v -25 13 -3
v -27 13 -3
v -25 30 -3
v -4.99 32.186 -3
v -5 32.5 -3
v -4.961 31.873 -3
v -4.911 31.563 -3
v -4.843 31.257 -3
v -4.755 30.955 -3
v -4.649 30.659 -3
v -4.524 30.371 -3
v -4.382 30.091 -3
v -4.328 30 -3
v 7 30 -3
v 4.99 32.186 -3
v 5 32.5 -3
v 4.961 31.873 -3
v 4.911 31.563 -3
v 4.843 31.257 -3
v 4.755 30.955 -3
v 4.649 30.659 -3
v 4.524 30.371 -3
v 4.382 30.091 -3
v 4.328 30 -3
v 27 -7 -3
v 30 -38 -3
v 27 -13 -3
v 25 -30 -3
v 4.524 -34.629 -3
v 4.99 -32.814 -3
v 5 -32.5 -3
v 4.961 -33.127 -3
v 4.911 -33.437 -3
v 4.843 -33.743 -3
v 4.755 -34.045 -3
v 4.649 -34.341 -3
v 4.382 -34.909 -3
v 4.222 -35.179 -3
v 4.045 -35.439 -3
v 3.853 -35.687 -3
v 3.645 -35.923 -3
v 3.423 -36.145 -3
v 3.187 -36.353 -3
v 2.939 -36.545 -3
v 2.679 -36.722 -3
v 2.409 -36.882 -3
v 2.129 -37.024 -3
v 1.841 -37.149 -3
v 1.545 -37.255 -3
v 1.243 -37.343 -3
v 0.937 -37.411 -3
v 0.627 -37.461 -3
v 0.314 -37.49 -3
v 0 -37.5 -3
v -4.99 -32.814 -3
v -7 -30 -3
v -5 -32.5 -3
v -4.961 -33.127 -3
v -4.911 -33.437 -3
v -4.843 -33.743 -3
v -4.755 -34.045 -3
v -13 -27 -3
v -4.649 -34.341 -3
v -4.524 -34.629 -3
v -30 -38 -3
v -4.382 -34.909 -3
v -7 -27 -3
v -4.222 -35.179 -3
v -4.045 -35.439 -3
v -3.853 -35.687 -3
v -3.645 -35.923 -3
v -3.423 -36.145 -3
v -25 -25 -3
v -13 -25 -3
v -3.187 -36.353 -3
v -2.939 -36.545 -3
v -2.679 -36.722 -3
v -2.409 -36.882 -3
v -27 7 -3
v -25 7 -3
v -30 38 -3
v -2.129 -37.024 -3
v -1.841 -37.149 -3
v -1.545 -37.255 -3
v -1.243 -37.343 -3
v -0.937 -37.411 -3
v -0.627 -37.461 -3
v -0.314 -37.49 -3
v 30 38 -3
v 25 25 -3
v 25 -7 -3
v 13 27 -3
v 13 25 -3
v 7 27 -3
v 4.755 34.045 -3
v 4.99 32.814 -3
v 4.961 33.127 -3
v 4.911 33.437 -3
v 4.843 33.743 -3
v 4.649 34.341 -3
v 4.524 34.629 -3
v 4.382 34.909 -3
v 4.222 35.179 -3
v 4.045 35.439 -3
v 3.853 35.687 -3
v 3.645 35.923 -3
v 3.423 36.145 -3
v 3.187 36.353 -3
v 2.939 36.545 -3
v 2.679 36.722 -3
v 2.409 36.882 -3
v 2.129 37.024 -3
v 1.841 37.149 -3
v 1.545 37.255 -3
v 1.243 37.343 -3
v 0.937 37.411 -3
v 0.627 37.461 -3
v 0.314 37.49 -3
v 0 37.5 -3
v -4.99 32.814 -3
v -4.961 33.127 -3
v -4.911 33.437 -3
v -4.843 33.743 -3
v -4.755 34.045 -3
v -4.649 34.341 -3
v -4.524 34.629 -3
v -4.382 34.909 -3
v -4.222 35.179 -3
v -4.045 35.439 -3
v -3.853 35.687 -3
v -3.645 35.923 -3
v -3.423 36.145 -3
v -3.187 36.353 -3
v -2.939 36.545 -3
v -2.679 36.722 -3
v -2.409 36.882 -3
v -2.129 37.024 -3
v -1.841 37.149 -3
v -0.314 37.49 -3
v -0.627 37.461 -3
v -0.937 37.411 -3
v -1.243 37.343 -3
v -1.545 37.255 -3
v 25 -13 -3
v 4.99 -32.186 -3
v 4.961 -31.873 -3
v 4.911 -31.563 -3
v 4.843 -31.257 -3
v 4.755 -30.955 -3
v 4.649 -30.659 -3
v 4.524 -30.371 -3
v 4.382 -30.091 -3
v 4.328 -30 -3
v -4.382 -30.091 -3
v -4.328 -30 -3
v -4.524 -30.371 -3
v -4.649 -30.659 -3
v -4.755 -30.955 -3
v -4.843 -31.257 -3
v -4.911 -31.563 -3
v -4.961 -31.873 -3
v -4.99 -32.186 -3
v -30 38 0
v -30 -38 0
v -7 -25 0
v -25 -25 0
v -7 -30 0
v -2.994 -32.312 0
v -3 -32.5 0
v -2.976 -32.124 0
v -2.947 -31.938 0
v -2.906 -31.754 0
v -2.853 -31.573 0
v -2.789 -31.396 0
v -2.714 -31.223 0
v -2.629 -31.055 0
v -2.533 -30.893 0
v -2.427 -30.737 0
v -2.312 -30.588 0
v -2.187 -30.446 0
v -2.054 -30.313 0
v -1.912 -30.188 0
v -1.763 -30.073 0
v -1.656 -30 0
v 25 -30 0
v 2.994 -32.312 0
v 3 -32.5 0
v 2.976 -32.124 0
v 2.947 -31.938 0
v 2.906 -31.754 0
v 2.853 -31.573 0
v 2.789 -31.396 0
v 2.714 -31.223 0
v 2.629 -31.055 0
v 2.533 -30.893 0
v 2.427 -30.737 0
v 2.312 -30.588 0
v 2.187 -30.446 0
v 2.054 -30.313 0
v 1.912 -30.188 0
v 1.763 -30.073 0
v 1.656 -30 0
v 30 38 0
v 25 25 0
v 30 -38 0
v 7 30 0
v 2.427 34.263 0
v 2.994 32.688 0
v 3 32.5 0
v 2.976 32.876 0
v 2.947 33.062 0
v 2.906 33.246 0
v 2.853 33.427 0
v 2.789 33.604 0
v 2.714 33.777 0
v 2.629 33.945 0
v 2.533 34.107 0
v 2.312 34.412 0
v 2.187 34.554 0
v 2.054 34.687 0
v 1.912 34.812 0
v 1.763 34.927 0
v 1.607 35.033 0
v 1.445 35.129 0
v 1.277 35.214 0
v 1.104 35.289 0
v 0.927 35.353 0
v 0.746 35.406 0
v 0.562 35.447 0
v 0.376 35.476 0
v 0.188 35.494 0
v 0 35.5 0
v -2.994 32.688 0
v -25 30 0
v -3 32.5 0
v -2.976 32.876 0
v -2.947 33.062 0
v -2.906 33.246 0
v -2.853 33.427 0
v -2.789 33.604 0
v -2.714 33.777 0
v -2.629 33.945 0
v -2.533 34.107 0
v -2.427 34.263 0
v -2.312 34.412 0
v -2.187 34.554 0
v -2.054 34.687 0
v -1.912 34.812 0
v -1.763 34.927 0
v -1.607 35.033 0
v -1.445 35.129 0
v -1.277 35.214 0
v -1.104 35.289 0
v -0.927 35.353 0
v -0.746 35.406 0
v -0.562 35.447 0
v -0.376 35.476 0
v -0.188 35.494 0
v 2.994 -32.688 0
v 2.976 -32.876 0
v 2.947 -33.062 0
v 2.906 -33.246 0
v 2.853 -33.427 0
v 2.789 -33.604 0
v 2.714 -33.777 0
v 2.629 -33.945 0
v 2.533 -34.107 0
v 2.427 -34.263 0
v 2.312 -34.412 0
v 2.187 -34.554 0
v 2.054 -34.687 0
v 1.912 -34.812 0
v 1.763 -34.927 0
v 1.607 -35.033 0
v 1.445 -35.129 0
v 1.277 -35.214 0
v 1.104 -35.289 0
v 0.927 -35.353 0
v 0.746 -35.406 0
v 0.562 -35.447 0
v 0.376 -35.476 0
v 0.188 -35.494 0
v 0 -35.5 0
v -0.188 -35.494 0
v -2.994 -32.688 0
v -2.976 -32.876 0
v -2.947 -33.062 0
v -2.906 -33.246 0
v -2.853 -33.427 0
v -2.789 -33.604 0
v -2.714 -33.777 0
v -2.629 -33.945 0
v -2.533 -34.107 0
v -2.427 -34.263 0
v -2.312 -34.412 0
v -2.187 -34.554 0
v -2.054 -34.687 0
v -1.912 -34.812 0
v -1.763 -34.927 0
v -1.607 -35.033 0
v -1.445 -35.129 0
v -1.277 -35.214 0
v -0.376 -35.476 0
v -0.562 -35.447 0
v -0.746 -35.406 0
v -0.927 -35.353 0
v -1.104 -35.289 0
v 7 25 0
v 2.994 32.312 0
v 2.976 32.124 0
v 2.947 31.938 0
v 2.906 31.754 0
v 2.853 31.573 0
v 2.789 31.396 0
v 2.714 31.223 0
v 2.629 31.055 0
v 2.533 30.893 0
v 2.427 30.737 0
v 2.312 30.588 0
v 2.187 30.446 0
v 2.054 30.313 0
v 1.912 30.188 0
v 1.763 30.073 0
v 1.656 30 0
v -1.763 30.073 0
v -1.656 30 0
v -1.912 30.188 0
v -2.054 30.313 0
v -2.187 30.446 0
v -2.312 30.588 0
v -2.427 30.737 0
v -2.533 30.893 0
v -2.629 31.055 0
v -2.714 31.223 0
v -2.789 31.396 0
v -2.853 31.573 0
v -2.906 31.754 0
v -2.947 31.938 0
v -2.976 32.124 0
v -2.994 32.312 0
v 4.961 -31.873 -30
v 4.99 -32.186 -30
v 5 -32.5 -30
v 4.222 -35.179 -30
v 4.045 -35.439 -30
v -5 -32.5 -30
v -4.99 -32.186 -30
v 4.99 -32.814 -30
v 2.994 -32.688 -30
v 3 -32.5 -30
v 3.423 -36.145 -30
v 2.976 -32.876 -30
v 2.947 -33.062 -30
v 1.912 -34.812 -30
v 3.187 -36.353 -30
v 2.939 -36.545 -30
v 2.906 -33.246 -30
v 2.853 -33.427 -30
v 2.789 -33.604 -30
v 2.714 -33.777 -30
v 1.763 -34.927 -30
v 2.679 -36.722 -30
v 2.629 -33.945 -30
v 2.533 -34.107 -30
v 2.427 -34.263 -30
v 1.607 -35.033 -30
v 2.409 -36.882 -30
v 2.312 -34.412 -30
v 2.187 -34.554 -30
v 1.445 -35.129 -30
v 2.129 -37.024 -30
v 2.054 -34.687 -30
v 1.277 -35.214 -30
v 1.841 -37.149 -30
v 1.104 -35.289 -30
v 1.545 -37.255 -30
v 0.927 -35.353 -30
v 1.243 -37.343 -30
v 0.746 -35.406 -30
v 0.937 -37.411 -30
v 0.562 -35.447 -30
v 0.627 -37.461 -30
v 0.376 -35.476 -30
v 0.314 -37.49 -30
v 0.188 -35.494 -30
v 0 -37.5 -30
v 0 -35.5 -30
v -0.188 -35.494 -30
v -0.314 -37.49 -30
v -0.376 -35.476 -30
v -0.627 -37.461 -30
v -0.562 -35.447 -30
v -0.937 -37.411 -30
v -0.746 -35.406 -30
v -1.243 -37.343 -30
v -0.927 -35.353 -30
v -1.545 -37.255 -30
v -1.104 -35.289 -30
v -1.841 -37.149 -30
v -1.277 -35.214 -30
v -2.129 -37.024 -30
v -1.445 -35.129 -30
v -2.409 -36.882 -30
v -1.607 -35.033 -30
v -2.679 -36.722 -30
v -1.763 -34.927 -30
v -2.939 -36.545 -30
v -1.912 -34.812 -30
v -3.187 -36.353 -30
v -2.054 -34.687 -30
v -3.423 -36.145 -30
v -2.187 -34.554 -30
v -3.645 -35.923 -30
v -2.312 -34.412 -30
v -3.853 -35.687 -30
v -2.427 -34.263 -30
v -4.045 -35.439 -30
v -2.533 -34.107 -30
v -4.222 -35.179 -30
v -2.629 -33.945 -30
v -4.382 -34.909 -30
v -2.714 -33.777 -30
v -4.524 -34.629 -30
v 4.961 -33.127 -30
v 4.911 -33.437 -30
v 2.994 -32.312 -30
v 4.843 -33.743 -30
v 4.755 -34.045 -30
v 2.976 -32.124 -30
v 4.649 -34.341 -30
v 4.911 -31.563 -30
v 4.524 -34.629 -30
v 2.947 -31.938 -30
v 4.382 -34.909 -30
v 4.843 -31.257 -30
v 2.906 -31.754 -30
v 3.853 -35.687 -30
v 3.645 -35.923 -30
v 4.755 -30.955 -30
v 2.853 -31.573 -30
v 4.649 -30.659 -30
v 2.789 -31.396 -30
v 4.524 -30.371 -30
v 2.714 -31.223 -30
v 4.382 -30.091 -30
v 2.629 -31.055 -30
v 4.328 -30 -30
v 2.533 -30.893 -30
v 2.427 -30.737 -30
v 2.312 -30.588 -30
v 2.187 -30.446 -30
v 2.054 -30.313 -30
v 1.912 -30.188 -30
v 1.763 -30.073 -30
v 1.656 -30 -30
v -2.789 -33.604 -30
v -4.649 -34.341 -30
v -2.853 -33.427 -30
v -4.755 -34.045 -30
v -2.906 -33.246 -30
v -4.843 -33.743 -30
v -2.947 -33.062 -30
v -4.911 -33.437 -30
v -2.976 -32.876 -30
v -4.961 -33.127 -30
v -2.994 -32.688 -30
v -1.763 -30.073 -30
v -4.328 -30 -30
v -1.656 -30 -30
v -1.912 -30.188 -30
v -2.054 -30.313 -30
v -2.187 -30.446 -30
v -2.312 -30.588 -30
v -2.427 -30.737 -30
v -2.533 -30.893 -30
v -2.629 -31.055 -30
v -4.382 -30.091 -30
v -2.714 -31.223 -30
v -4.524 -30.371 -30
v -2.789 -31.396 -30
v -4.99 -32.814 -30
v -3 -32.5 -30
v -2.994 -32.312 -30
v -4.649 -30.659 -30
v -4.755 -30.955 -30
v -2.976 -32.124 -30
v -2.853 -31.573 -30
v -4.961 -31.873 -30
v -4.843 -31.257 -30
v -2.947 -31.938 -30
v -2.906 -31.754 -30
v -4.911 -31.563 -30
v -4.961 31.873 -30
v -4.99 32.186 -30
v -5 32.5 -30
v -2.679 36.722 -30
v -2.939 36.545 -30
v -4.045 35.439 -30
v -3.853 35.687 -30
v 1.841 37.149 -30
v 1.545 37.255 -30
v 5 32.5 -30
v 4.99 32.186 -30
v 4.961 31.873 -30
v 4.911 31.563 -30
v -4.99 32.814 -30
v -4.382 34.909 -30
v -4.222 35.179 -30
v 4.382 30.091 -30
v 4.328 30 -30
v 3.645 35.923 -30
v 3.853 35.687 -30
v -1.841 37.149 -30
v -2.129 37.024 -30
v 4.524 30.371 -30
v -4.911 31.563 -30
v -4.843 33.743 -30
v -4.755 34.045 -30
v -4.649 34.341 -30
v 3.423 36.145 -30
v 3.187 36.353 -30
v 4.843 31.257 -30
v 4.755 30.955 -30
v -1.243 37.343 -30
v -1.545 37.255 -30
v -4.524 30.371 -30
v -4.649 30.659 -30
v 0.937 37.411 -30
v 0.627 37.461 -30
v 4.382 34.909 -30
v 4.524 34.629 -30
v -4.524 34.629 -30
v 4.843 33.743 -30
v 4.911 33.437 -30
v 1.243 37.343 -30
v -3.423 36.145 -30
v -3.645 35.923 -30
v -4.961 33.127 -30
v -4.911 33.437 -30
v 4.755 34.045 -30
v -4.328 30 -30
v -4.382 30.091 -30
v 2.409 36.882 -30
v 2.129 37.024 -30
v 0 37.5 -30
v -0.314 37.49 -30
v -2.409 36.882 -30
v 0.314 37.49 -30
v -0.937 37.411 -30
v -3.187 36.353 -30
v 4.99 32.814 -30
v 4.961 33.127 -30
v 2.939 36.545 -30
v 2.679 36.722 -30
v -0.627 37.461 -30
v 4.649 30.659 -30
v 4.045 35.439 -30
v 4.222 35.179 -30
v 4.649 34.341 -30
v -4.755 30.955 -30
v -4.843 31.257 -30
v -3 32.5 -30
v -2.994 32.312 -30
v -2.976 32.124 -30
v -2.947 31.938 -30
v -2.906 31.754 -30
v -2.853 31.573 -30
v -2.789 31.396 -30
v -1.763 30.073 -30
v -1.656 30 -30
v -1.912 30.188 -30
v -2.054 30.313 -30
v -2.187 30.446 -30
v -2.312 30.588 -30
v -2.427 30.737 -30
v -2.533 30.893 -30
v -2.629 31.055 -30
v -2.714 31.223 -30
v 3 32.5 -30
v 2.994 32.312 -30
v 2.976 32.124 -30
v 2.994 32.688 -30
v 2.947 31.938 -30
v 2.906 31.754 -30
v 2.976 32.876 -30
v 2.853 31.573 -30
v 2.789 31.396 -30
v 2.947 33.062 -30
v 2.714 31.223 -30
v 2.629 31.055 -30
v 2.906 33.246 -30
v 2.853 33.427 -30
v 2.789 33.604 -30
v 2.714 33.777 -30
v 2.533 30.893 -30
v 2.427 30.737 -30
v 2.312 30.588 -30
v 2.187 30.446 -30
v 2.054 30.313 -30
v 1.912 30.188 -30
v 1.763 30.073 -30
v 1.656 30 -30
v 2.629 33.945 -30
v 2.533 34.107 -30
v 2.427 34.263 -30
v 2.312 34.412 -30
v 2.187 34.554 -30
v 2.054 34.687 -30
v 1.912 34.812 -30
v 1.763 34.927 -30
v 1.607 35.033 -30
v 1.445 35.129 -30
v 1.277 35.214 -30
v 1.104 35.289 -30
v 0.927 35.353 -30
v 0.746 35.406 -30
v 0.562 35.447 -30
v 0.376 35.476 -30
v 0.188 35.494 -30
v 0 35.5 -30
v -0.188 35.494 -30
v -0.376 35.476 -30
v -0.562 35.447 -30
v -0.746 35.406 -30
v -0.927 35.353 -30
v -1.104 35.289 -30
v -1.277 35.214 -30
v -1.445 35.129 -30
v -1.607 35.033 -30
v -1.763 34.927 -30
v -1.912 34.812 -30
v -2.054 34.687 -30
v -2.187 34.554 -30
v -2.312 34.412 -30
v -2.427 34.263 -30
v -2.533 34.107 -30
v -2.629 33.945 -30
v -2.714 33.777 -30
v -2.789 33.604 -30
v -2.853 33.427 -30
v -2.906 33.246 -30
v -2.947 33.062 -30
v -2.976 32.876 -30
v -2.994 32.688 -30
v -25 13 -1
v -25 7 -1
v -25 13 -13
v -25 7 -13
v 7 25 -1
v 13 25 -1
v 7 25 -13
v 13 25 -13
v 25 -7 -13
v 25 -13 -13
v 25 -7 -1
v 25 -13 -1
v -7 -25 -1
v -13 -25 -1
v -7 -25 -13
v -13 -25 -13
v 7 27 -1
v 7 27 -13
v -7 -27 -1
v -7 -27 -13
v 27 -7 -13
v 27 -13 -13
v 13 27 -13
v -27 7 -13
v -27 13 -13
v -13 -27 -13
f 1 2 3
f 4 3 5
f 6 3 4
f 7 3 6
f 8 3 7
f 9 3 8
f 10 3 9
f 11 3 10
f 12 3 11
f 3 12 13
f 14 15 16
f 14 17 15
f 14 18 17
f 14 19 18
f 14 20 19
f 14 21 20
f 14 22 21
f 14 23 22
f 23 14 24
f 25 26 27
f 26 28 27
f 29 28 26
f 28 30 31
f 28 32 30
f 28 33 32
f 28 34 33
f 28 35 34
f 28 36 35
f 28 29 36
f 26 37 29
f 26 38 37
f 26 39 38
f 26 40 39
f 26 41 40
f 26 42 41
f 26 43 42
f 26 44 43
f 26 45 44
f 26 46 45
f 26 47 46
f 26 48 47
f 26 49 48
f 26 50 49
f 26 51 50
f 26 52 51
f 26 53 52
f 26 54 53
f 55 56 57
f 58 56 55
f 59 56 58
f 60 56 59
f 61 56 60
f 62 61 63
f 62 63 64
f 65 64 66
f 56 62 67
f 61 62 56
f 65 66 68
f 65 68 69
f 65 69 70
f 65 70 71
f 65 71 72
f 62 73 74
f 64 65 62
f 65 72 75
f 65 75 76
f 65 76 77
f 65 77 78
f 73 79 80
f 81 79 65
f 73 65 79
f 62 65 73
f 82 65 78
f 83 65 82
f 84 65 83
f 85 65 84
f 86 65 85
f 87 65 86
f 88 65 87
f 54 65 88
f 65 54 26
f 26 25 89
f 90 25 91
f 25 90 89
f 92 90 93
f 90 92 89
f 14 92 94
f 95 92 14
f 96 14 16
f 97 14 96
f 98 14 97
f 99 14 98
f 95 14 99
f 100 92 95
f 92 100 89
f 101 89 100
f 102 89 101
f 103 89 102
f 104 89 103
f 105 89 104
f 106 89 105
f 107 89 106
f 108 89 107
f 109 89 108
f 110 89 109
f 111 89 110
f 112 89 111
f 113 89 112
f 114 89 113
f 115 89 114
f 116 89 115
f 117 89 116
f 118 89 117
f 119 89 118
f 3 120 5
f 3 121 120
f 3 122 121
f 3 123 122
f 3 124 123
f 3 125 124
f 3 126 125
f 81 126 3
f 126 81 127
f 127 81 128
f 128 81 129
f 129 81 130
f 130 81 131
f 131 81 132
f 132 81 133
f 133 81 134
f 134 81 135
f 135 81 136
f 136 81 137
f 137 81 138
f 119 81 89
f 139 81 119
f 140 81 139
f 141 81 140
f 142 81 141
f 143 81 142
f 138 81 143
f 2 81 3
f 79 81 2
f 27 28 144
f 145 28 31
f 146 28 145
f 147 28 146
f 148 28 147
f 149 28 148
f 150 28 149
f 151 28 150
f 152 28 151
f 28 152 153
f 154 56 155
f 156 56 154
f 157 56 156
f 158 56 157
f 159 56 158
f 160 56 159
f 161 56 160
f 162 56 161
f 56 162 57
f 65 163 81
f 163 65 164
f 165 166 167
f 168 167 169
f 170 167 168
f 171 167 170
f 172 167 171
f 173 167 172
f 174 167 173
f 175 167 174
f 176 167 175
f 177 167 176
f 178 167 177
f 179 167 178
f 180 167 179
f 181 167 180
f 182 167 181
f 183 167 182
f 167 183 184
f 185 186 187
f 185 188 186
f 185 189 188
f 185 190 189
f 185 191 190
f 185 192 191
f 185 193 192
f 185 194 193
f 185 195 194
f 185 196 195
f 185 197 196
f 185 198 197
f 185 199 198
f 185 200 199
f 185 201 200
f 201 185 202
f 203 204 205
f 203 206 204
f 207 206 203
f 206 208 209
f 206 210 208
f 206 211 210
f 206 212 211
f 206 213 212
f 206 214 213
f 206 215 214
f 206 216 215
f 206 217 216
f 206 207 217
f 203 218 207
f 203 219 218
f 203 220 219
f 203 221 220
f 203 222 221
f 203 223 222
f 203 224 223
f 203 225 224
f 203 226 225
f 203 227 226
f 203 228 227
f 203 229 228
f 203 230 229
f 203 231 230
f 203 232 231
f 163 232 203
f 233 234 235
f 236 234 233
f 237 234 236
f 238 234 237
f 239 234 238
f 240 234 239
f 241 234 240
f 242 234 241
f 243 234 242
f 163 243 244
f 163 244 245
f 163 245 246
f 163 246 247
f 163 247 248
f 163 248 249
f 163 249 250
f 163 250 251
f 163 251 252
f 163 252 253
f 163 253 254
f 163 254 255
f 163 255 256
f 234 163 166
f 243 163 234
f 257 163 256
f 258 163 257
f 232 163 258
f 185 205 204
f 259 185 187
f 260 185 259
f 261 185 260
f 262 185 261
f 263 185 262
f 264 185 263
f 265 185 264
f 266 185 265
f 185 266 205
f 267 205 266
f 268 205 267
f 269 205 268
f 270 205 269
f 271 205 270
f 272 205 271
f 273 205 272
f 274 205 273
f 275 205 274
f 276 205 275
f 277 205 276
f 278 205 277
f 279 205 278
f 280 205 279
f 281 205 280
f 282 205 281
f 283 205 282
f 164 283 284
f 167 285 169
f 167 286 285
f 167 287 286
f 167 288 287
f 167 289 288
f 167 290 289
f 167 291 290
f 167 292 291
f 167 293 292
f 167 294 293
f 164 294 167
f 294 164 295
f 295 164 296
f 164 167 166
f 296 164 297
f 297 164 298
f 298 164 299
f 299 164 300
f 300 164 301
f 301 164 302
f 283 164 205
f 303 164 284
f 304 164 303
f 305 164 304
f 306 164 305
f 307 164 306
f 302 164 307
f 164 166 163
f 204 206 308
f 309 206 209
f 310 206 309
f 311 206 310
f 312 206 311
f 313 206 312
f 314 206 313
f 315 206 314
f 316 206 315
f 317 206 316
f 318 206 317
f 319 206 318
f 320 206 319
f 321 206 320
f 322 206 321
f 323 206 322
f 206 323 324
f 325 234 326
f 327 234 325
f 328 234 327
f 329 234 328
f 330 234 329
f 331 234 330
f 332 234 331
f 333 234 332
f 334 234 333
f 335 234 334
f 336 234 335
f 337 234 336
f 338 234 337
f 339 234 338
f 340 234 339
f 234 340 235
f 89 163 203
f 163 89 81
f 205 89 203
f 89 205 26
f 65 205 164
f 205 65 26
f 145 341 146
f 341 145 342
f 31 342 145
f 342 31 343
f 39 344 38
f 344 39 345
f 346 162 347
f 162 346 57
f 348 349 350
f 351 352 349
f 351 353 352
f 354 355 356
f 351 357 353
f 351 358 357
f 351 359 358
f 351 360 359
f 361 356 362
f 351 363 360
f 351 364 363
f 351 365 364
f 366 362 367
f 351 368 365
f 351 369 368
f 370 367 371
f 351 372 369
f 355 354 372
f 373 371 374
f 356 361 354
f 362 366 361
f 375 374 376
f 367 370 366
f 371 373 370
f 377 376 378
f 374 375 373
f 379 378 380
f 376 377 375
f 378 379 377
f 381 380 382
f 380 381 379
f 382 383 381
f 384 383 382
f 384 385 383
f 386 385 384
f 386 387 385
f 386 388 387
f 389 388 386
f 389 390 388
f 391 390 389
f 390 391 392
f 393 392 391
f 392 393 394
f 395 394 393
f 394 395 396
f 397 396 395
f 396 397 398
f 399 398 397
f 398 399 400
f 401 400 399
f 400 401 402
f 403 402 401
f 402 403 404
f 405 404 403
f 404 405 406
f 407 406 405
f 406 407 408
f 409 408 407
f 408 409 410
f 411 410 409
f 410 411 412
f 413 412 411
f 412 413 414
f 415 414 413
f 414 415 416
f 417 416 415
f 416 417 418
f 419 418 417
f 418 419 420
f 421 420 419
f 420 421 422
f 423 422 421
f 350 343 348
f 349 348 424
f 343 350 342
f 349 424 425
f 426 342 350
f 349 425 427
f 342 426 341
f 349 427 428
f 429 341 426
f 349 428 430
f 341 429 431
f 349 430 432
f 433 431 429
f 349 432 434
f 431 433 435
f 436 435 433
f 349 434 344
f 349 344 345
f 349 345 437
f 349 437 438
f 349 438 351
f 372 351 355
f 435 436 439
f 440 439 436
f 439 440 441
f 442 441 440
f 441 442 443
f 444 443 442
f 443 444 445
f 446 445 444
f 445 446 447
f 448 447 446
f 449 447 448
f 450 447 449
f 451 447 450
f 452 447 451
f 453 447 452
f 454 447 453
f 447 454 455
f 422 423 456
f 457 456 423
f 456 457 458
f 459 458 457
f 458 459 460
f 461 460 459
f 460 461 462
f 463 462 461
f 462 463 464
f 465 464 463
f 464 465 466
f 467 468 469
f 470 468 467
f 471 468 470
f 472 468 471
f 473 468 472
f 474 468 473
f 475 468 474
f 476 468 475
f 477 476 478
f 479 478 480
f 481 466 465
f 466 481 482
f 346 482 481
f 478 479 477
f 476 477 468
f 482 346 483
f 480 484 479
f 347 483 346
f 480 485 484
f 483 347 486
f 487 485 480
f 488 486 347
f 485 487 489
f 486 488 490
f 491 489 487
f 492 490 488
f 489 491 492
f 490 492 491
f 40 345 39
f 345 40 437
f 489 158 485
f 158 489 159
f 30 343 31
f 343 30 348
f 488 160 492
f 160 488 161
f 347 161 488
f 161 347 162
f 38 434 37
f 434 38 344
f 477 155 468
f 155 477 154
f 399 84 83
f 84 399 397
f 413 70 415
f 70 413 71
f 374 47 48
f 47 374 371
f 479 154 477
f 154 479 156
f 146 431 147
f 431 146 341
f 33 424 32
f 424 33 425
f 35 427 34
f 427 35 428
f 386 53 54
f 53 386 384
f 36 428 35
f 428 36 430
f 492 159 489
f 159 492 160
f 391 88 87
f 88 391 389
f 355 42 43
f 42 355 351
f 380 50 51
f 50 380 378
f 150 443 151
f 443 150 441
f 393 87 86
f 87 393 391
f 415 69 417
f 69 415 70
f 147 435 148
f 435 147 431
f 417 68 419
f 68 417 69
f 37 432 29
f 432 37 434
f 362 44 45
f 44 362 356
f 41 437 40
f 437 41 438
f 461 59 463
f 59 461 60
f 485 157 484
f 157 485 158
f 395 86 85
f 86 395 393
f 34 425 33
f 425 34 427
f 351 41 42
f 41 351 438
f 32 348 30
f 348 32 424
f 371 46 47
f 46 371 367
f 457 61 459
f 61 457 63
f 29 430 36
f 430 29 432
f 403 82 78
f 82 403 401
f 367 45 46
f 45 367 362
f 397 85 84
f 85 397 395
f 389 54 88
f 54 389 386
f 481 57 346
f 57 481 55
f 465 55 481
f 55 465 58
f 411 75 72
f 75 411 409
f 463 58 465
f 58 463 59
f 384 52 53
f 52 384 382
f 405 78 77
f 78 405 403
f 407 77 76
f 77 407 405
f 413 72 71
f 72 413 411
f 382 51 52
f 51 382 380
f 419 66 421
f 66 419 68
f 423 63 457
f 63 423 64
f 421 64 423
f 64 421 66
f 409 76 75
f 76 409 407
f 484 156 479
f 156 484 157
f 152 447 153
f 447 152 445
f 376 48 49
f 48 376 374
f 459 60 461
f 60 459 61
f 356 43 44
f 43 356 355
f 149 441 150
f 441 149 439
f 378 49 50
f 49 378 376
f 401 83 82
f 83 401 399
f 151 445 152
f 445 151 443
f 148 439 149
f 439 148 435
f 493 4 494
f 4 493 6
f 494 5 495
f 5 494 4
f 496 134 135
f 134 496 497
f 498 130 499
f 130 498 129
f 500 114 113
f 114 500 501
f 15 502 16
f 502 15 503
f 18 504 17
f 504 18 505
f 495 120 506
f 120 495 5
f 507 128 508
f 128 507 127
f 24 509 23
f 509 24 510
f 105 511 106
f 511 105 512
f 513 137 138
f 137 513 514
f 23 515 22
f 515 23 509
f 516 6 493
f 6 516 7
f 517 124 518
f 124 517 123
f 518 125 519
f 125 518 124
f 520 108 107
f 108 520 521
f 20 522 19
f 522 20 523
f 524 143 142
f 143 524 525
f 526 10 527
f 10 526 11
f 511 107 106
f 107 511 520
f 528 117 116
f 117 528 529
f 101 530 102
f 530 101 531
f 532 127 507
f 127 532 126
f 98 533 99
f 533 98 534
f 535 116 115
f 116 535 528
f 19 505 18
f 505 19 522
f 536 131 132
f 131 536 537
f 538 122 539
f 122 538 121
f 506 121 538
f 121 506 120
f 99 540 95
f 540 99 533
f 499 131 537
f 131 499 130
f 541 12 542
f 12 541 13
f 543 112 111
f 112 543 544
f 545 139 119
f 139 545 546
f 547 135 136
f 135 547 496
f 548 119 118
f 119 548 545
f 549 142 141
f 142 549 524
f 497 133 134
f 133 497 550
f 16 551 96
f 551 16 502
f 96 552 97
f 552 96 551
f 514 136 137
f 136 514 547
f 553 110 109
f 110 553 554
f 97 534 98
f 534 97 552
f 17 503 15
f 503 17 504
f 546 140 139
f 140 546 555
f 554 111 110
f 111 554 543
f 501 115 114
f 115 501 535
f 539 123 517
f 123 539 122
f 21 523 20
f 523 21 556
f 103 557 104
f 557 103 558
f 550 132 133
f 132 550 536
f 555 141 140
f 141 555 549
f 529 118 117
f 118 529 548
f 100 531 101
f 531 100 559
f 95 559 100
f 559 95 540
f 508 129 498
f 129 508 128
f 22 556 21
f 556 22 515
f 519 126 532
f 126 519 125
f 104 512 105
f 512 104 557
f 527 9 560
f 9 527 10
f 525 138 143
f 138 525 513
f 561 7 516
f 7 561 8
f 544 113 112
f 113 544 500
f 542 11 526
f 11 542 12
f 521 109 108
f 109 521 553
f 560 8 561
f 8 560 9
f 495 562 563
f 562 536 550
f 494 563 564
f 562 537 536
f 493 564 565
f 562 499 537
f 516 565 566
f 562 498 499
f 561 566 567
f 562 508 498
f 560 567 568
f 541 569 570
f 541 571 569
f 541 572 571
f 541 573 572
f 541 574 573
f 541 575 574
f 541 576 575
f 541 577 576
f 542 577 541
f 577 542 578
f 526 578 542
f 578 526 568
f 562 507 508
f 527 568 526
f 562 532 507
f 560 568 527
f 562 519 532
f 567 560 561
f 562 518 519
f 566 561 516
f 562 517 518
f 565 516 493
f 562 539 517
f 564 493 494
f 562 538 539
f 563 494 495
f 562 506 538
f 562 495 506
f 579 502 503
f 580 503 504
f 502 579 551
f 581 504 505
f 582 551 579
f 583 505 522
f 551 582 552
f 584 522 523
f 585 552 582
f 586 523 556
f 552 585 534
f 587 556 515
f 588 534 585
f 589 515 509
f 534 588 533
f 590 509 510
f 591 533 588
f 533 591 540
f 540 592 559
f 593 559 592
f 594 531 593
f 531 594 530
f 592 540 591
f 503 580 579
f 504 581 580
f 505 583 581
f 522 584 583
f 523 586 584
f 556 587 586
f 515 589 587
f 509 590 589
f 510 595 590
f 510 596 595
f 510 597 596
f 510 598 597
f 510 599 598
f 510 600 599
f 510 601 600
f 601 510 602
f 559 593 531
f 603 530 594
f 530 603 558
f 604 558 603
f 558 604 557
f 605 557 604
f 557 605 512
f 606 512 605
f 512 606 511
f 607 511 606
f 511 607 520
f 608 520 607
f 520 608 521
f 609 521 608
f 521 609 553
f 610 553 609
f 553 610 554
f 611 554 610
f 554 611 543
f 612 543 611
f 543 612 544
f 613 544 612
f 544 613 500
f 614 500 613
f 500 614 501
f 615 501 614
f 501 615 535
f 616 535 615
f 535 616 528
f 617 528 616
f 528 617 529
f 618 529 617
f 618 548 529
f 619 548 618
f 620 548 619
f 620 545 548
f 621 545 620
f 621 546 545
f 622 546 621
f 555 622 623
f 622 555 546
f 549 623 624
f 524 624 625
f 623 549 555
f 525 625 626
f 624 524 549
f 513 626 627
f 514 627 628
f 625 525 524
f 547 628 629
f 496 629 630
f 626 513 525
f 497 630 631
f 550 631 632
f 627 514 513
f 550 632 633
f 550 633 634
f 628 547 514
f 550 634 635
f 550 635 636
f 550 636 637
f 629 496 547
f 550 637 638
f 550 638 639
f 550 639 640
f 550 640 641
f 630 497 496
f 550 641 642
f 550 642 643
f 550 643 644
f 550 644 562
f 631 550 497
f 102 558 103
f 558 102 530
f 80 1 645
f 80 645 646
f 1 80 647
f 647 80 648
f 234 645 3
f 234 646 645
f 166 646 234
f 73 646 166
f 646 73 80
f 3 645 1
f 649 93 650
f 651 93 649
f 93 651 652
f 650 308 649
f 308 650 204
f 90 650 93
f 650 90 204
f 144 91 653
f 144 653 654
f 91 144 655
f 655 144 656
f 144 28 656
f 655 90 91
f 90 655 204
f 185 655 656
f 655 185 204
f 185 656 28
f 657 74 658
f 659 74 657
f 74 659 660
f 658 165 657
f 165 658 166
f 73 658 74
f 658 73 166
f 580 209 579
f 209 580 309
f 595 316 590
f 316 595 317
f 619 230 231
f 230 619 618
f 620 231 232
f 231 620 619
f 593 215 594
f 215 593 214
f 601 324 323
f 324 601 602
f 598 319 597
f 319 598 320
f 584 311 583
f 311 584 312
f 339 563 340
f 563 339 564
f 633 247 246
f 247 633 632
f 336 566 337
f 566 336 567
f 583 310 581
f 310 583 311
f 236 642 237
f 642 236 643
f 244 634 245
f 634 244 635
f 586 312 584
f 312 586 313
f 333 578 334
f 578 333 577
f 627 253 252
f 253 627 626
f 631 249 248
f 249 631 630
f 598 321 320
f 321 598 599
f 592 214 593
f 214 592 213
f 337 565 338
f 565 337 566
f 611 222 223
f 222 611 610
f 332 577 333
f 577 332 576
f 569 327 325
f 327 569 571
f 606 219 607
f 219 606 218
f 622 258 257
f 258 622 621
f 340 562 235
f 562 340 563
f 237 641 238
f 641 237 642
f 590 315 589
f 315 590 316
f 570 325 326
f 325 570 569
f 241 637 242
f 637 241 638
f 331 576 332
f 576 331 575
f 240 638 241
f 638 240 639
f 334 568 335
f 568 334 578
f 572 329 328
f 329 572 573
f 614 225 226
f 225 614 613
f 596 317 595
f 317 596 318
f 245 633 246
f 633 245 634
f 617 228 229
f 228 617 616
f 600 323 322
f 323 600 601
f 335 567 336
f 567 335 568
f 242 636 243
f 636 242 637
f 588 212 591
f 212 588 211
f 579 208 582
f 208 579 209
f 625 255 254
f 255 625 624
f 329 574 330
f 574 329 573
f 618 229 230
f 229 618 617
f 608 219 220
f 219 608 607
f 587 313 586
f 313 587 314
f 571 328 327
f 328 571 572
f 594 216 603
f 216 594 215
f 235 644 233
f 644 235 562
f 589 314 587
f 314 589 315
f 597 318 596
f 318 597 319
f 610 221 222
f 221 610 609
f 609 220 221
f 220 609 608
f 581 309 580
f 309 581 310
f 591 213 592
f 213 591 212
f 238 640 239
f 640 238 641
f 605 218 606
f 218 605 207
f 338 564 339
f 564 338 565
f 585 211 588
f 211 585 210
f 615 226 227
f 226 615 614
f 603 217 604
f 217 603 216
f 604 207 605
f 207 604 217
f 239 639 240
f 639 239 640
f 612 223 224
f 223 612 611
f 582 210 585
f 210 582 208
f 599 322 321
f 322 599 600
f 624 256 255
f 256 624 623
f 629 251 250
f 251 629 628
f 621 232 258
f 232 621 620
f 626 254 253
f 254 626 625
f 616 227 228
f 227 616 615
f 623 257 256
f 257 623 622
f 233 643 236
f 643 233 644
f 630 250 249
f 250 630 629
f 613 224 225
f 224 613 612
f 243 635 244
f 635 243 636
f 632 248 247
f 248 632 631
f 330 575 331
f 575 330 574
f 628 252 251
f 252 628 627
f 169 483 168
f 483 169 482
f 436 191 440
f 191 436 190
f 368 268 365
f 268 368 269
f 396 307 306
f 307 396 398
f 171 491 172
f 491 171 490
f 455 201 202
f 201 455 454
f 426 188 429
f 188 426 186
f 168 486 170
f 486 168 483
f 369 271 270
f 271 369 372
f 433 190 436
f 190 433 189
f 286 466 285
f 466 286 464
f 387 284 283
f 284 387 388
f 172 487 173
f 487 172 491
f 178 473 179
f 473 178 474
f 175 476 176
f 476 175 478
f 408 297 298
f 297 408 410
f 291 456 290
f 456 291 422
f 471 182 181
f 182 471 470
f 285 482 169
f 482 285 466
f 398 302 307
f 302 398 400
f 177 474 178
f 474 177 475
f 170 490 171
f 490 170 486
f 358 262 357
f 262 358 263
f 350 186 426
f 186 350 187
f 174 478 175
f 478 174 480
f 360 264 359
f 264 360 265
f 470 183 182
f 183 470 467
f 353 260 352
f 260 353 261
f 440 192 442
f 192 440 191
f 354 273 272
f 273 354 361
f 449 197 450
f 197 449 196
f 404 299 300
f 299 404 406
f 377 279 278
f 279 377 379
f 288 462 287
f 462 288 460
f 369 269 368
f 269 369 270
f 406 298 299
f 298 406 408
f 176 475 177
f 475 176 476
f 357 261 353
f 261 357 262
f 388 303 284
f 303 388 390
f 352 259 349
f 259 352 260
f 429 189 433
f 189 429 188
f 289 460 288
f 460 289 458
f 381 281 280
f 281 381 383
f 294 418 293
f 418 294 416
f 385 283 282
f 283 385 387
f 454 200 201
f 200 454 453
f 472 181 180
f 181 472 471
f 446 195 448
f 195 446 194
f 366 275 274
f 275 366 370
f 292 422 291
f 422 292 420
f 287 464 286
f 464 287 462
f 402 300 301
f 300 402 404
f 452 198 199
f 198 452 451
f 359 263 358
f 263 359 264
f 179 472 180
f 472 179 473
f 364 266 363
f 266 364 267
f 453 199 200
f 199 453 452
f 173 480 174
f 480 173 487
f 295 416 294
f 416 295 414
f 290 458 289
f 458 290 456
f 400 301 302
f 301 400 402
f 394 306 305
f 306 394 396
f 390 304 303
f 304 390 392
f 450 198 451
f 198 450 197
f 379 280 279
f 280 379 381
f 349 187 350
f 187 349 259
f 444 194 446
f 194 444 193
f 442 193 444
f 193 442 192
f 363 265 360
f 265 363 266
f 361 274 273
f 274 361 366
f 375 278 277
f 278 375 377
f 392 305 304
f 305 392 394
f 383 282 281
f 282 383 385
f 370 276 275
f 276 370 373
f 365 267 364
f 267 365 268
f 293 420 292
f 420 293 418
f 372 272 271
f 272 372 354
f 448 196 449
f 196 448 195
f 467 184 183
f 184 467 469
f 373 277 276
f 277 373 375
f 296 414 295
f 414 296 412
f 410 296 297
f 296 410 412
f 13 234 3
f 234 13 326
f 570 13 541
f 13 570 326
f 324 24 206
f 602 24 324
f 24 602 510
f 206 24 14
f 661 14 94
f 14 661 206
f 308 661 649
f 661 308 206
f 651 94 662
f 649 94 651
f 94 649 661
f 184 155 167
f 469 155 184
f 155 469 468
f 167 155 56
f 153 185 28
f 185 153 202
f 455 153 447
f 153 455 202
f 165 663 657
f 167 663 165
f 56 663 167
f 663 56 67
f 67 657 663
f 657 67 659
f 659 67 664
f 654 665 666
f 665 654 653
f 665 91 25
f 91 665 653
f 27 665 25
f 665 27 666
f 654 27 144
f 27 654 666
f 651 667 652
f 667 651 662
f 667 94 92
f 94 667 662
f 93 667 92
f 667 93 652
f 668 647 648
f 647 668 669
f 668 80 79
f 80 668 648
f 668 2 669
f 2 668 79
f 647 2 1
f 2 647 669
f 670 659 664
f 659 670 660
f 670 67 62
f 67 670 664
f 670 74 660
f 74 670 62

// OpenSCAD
// color(c = "#000088")  rotate([180, 0, 0]) translate([-110, -110, 0]) import("base.stl");
$fn = 100; 

rotate([0, 0, 0]) translate([25, -13, -13]) linear_extrude(height = 12) square([2, 6]);
rotate([0, 0, 90]) translate([25, -13, -13]) linear_extrude(height = 12) square([2, 6]); 
rotate([0, 0, 180]) translate([25, -13, -13]) linear_extrude(height = 12) square([2, 6]); 
rotate([0, 0, 270]) translate([25, -13, -13]) linear_extrude(height = 12) square([2, 6]); 



difference() {
    union() {
        translate([0, 0, -3]) linear_extrude(height = 3) square([60, 76], center=true);
        rotate([0, 0, 0]) translate([0, -32.5, -30]) linear_extrude(height = 30) circle(d = 10);
        rotate([0, 0, 180]) translate([0, -32.5, -30]) linear_extrude(height = 30) circle(d = 10);
        // translate([0, 32.5, -30]) linear_extrude(height = 30) circle(d = 10);
    }

    union() {
        translate([0, 0, -4]) linear_extrude(height = 6) square([50, 50], center=true);
        rotate([0, 0, 0]) translate([0, 32.5, -32]) linear_extrude(height = 36) circle(d = 6);
        rotate([0, 0, 180]) translate([0, 32.5, -32]) linear_extrude(height = 36) circle(d = 6);
        // translate([0, -32.5, -32]) linear_extrude(height = 36) circle(d = 6);
        rotate([0, 0, 0]) translate([-9, 27, -32]) linear_extrude(height = 34) square([32, 6], center=true);
        rotate([0, 0, 180]) translate([-9, 27, -32]) linear_extrude(height = 34) square([32, 6], center=true);

    }
}
